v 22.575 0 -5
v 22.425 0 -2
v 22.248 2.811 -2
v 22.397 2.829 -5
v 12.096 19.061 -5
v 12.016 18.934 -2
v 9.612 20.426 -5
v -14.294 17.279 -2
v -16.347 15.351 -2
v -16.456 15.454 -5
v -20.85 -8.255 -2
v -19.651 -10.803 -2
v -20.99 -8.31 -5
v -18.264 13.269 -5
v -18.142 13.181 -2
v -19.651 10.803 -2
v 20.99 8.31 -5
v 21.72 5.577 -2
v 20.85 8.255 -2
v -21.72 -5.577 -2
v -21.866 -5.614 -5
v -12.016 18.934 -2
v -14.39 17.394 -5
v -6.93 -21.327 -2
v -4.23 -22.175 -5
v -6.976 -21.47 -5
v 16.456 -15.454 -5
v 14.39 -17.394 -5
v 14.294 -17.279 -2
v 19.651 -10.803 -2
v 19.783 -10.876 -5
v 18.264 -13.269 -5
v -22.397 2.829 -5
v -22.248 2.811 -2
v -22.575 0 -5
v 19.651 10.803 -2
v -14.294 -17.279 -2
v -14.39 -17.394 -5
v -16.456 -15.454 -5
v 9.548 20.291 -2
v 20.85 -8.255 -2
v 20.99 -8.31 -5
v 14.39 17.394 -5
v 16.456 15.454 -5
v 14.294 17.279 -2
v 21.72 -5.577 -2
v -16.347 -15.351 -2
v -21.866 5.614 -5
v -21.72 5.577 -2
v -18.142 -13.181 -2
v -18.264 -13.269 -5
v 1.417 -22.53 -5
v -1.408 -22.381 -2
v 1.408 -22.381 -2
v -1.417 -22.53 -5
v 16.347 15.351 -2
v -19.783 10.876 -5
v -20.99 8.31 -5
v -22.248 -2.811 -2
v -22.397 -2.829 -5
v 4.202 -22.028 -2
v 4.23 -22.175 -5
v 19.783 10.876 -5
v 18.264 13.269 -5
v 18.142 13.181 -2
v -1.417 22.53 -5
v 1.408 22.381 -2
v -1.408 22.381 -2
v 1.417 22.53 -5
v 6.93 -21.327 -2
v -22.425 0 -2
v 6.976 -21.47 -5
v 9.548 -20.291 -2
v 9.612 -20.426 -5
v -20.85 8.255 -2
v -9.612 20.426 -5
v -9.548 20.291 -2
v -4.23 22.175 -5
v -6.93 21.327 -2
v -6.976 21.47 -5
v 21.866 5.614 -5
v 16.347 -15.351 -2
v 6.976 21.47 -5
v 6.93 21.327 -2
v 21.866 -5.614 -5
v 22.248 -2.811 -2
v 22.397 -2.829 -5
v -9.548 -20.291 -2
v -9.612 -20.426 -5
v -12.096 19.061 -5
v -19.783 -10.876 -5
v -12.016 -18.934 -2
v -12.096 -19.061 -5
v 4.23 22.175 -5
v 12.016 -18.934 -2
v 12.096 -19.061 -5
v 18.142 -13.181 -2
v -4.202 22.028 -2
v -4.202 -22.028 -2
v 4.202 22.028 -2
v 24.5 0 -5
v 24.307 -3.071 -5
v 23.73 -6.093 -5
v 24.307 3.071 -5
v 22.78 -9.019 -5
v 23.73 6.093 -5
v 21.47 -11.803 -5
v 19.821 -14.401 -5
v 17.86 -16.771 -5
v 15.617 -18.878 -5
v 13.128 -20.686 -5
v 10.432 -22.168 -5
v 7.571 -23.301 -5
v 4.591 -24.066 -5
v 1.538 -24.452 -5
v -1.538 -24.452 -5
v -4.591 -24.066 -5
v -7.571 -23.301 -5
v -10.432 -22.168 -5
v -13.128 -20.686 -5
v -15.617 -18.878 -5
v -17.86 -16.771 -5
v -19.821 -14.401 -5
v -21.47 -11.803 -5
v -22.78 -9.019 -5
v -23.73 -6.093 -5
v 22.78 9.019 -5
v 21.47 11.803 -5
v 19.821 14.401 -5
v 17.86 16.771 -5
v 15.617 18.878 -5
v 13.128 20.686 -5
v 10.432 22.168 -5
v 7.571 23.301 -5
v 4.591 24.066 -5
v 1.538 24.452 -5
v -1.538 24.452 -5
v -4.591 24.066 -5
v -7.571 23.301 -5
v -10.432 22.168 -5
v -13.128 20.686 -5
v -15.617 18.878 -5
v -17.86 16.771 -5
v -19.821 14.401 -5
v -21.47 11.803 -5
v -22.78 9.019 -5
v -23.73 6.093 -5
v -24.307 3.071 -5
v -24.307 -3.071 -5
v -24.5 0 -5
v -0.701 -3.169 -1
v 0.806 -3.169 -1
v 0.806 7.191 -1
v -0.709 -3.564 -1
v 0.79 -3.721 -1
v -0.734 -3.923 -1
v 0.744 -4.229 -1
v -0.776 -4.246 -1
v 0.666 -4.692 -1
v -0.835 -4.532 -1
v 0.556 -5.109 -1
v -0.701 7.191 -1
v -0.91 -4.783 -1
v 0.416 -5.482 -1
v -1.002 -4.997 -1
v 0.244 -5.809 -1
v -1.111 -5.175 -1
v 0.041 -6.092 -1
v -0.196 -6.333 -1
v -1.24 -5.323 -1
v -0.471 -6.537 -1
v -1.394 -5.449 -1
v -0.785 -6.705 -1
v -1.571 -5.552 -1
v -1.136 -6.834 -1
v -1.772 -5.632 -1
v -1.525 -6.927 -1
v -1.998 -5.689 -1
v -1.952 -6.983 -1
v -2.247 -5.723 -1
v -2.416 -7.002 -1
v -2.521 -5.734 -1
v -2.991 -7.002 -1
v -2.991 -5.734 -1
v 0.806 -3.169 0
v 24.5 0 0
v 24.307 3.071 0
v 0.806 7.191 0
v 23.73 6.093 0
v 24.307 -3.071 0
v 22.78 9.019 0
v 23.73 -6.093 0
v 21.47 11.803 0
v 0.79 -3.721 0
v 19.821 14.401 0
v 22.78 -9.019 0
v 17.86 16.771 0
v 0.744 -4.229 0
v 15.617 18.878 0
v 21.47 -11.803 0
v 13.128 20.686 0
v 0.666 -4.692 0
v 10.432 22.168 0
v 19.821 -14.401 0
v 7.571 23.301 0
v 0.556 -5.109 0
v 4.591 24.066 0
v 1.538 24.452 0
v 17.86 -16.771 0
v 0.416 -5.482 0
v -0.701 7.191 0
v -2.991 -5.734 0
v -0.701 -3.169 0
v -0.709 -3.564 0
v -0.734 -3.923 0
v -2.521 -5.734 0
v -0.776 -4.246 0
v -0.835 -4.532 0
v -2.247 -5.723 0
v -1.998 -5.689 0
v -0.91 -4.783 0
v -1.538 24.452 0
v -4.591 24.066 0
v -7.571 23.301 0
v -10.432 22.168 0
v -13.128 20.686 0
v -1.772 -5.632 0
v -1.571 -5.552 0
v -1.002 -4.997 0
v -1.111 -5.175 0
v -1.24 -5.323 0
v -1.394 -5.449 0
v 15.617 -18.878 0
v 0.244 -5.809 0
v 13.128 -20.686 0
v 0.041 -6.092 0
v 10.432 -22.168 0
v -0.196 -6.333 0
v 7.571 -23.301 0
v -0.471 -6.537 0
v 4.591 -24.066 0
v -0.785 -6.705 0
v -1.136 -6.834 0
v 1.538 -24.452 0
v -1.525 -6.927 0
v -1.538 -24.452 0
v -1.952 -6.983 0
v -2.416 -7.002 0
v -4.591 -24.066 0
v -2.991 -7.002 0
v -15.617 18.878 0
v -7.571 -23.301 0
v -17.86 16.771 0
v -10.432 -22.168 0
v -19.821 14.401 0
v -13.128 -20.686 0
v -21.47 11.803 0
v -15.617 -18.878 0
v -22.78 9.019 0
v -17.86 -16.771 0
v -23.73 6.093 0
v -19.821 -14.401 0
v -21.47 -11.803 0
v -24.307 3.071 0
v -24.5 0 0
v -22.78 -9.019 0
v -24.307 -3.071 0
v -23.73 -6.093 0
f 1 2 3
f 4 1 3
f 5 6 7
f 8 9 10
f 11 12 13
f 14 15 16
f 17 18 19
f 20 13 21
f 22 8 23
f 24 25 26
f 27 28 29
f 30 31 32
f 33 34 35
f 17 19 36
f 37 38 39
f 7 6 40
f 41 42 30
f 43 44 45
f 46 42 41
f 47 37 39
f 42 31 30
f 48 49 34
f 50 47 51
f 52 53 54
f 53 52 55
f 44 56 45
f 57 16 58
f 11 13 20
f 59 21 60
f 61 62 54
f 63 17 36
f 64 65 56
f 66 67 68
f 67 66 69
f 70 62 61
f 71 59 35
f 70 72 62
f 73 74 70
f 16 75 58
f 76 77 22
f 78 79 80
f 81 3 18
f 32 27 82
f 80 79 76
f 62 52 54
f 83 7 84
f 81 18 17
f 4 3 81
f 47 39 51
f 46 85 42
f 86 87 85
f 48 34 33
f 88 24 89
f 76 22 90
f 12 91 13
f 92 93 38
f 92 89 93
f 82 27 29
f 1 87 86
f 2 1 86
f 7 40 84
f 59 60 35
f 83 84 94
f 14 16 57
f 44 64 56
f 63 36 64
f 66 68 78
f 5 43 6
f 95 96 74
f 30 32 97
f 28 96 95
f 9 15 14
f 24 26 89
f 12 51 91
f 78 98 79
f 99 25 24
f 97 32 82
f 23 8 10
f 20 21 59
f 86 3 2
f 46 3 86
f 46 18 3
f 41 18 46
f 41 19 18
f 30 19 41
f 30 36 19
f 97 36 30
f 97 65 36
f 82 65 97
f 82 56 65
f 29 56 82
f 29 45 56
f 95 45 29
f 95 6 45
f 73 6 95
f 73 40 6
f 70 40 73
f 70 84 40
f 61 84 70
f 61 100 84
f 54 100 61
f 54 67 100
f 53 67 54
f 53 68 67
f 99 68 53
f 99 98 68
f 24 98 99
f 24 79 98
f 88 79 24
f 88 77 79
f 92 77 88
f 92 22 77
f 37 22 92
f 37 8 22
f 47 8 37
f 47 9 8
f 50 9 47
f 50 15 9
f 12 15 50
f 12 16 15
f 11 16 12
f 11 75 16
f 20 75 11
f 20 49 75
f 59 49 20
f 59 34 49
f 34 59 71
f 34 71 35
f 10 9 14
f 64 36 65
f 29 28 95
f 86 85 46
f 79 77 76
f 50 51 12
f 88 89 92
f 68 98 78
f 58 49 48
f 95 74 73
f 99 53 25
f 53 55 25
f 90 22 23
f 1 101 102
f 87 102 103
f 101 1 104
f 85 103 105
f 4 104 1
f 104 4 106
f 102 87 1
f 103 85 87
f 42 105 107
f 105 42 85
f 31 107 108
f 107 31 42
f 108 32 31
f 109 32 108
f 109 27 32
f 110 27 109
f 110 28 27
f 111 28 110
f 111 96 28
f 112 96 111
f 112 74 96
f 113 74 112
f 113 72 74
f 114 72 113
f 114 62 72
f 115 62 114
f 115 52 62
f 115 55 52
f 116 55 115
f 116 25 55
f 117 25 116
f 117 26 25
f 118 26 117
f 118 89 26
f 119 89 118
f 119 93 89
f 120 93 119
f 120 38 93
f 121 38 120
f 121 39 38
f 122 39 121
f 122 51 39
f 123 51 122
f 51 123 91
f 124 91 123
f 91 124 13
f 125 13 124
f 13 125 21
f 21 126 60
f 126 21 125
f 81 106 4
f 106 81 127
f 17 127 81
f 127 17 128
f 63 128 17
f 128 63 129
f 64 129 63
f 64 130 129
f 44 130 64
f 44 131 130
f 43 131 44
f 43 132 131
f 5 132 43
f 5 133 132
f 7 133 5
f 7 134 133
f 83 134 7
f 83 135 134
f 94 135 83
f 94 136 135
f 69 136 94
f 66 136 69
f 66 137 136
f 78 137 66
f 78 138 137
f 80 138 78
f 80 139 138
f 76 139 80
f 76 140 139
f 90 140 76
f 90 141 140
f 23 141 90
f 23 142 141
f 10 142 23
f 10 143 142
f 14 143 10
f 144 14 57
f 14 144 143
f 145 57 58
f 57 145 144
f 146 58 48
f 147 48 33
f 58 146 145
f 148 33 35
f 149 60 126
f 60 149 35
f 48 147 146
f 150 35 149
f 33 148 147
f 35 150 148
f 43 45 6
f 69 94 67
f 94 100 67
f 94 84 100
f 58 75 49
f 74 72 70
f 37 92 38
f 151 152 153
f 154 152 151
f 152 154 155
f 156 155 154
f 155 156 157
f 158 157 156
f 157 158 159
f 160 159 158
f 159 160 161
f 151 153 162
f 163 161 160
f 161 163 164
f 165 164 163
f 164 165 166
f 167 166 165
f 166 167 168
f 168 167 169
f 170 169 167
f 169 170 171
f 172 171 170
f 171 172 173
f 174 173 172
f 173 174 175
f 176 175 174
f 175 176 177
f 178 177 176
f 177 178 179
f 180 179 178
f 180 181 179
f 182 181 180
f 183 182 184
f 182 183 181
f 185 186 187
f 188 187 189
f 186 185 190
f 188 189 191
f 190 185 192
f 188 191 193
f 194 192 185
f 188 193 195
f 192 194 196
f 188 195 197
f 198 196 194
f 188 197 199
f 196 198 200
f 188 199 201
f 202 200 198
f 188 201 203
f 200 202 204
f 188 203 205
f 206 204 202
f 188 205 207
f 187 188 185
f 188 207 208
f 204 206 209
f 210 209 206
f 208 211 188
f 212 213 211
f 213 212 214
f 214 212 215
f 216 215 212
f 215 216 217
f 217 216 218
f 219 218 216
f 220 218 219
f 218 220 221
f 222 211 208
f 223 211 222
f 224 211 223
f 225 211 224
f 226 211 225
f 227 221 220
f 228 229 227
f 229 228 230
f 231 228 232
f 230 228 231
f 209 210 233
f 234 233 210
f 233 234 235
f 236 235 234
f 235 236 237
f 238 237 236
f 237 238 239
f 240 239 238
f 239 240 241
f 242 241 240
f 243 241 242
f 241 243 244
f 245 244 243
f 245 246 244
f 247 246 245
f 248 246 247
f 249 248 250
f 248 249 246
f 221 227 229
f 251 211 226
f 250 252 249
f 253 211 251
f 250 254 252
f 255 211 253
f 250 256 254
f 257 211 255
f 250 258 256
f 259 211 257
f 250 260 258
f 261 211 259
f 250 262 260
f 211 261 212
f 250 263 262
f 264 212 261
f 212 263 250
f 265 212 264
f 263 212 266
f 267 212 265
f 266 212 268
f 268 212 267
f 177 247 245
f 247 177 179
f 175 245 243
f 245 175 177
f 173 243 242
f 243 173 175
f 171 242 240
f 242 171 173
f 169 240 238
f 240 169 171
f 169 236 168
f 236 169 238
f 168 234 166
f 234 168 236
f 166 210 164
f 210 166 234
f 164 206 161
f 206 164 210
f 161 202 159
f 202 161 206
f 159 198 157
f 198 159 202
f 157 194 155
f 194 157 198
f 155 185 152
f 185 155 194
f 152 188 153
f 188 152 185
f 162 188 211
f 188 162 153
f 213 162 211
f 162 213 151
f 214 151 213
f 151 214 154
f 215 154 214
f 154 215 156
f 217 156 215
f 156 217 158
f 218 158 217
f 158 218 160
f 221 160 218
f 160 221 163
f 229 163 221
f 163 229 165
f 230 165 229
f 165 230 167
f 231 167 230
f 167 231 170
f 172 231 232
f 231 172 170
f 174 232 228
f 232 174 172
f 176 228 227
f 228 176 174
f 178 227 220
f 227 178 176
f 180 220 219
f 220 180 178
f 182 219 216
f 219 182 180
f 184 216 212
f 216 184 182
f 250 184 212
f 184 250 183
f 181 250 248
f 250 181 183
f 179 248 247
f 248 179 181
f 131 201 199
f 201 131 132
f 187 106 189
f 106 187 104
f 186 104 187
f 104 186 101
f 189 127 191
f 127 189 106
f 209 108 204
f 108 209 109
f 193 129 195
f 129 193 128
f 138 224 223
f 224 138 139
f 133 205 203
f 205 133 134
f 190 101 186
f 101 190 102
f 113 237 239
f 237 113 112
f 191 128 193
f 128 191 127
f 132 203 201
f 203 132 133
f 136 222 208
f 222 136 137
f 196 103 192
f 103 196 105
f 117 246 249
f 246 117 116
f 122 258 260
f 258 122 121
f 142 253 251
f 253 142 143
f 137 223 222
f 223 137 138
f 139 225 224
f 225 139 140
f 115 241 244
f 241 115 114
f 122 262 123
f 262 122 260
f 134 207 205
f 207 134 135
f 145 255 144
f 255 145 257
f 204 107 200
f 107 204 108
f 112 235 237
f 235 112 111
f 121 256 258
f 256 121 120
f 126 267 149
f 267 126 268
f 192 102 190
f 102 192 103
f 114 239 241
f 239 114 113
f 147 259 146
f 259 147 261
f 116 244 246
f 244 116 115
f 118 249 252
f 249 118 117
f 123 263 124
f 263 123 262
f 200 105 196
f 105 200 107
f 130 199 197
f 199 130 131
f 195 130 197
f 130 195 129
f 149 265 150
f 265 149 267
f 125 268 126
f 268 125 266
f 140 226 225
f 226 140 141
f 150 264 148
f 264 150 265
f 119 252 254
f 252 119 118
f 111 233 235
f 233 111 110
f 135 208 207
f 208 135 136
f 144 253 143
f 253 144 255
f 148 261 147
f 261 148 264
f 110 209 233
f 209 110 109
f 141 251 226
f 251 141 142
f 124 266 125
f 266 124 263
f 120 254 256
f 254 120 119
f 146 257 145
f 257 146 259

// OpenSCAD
$fn = 50;


difference() {
	union() {
		translate(v = [0, 0, -5.0000000000]) {
			cylinder(h = 5, r = 24.5000000000);
		}
	}
	union() {
		#translate(v = [0, 0, -5.0000000000]) {
			cylinder(h = 3, r1 = 22.5750000000, r2 = 22.4250000000);
		}
		translate(v = [0, 0, -1]) {
			linear_extrude(height = 1) {
				text(font = "Wingdings", halign = "center", size = 11, text = "J", valign = "center");
			}
		}
	}
}
